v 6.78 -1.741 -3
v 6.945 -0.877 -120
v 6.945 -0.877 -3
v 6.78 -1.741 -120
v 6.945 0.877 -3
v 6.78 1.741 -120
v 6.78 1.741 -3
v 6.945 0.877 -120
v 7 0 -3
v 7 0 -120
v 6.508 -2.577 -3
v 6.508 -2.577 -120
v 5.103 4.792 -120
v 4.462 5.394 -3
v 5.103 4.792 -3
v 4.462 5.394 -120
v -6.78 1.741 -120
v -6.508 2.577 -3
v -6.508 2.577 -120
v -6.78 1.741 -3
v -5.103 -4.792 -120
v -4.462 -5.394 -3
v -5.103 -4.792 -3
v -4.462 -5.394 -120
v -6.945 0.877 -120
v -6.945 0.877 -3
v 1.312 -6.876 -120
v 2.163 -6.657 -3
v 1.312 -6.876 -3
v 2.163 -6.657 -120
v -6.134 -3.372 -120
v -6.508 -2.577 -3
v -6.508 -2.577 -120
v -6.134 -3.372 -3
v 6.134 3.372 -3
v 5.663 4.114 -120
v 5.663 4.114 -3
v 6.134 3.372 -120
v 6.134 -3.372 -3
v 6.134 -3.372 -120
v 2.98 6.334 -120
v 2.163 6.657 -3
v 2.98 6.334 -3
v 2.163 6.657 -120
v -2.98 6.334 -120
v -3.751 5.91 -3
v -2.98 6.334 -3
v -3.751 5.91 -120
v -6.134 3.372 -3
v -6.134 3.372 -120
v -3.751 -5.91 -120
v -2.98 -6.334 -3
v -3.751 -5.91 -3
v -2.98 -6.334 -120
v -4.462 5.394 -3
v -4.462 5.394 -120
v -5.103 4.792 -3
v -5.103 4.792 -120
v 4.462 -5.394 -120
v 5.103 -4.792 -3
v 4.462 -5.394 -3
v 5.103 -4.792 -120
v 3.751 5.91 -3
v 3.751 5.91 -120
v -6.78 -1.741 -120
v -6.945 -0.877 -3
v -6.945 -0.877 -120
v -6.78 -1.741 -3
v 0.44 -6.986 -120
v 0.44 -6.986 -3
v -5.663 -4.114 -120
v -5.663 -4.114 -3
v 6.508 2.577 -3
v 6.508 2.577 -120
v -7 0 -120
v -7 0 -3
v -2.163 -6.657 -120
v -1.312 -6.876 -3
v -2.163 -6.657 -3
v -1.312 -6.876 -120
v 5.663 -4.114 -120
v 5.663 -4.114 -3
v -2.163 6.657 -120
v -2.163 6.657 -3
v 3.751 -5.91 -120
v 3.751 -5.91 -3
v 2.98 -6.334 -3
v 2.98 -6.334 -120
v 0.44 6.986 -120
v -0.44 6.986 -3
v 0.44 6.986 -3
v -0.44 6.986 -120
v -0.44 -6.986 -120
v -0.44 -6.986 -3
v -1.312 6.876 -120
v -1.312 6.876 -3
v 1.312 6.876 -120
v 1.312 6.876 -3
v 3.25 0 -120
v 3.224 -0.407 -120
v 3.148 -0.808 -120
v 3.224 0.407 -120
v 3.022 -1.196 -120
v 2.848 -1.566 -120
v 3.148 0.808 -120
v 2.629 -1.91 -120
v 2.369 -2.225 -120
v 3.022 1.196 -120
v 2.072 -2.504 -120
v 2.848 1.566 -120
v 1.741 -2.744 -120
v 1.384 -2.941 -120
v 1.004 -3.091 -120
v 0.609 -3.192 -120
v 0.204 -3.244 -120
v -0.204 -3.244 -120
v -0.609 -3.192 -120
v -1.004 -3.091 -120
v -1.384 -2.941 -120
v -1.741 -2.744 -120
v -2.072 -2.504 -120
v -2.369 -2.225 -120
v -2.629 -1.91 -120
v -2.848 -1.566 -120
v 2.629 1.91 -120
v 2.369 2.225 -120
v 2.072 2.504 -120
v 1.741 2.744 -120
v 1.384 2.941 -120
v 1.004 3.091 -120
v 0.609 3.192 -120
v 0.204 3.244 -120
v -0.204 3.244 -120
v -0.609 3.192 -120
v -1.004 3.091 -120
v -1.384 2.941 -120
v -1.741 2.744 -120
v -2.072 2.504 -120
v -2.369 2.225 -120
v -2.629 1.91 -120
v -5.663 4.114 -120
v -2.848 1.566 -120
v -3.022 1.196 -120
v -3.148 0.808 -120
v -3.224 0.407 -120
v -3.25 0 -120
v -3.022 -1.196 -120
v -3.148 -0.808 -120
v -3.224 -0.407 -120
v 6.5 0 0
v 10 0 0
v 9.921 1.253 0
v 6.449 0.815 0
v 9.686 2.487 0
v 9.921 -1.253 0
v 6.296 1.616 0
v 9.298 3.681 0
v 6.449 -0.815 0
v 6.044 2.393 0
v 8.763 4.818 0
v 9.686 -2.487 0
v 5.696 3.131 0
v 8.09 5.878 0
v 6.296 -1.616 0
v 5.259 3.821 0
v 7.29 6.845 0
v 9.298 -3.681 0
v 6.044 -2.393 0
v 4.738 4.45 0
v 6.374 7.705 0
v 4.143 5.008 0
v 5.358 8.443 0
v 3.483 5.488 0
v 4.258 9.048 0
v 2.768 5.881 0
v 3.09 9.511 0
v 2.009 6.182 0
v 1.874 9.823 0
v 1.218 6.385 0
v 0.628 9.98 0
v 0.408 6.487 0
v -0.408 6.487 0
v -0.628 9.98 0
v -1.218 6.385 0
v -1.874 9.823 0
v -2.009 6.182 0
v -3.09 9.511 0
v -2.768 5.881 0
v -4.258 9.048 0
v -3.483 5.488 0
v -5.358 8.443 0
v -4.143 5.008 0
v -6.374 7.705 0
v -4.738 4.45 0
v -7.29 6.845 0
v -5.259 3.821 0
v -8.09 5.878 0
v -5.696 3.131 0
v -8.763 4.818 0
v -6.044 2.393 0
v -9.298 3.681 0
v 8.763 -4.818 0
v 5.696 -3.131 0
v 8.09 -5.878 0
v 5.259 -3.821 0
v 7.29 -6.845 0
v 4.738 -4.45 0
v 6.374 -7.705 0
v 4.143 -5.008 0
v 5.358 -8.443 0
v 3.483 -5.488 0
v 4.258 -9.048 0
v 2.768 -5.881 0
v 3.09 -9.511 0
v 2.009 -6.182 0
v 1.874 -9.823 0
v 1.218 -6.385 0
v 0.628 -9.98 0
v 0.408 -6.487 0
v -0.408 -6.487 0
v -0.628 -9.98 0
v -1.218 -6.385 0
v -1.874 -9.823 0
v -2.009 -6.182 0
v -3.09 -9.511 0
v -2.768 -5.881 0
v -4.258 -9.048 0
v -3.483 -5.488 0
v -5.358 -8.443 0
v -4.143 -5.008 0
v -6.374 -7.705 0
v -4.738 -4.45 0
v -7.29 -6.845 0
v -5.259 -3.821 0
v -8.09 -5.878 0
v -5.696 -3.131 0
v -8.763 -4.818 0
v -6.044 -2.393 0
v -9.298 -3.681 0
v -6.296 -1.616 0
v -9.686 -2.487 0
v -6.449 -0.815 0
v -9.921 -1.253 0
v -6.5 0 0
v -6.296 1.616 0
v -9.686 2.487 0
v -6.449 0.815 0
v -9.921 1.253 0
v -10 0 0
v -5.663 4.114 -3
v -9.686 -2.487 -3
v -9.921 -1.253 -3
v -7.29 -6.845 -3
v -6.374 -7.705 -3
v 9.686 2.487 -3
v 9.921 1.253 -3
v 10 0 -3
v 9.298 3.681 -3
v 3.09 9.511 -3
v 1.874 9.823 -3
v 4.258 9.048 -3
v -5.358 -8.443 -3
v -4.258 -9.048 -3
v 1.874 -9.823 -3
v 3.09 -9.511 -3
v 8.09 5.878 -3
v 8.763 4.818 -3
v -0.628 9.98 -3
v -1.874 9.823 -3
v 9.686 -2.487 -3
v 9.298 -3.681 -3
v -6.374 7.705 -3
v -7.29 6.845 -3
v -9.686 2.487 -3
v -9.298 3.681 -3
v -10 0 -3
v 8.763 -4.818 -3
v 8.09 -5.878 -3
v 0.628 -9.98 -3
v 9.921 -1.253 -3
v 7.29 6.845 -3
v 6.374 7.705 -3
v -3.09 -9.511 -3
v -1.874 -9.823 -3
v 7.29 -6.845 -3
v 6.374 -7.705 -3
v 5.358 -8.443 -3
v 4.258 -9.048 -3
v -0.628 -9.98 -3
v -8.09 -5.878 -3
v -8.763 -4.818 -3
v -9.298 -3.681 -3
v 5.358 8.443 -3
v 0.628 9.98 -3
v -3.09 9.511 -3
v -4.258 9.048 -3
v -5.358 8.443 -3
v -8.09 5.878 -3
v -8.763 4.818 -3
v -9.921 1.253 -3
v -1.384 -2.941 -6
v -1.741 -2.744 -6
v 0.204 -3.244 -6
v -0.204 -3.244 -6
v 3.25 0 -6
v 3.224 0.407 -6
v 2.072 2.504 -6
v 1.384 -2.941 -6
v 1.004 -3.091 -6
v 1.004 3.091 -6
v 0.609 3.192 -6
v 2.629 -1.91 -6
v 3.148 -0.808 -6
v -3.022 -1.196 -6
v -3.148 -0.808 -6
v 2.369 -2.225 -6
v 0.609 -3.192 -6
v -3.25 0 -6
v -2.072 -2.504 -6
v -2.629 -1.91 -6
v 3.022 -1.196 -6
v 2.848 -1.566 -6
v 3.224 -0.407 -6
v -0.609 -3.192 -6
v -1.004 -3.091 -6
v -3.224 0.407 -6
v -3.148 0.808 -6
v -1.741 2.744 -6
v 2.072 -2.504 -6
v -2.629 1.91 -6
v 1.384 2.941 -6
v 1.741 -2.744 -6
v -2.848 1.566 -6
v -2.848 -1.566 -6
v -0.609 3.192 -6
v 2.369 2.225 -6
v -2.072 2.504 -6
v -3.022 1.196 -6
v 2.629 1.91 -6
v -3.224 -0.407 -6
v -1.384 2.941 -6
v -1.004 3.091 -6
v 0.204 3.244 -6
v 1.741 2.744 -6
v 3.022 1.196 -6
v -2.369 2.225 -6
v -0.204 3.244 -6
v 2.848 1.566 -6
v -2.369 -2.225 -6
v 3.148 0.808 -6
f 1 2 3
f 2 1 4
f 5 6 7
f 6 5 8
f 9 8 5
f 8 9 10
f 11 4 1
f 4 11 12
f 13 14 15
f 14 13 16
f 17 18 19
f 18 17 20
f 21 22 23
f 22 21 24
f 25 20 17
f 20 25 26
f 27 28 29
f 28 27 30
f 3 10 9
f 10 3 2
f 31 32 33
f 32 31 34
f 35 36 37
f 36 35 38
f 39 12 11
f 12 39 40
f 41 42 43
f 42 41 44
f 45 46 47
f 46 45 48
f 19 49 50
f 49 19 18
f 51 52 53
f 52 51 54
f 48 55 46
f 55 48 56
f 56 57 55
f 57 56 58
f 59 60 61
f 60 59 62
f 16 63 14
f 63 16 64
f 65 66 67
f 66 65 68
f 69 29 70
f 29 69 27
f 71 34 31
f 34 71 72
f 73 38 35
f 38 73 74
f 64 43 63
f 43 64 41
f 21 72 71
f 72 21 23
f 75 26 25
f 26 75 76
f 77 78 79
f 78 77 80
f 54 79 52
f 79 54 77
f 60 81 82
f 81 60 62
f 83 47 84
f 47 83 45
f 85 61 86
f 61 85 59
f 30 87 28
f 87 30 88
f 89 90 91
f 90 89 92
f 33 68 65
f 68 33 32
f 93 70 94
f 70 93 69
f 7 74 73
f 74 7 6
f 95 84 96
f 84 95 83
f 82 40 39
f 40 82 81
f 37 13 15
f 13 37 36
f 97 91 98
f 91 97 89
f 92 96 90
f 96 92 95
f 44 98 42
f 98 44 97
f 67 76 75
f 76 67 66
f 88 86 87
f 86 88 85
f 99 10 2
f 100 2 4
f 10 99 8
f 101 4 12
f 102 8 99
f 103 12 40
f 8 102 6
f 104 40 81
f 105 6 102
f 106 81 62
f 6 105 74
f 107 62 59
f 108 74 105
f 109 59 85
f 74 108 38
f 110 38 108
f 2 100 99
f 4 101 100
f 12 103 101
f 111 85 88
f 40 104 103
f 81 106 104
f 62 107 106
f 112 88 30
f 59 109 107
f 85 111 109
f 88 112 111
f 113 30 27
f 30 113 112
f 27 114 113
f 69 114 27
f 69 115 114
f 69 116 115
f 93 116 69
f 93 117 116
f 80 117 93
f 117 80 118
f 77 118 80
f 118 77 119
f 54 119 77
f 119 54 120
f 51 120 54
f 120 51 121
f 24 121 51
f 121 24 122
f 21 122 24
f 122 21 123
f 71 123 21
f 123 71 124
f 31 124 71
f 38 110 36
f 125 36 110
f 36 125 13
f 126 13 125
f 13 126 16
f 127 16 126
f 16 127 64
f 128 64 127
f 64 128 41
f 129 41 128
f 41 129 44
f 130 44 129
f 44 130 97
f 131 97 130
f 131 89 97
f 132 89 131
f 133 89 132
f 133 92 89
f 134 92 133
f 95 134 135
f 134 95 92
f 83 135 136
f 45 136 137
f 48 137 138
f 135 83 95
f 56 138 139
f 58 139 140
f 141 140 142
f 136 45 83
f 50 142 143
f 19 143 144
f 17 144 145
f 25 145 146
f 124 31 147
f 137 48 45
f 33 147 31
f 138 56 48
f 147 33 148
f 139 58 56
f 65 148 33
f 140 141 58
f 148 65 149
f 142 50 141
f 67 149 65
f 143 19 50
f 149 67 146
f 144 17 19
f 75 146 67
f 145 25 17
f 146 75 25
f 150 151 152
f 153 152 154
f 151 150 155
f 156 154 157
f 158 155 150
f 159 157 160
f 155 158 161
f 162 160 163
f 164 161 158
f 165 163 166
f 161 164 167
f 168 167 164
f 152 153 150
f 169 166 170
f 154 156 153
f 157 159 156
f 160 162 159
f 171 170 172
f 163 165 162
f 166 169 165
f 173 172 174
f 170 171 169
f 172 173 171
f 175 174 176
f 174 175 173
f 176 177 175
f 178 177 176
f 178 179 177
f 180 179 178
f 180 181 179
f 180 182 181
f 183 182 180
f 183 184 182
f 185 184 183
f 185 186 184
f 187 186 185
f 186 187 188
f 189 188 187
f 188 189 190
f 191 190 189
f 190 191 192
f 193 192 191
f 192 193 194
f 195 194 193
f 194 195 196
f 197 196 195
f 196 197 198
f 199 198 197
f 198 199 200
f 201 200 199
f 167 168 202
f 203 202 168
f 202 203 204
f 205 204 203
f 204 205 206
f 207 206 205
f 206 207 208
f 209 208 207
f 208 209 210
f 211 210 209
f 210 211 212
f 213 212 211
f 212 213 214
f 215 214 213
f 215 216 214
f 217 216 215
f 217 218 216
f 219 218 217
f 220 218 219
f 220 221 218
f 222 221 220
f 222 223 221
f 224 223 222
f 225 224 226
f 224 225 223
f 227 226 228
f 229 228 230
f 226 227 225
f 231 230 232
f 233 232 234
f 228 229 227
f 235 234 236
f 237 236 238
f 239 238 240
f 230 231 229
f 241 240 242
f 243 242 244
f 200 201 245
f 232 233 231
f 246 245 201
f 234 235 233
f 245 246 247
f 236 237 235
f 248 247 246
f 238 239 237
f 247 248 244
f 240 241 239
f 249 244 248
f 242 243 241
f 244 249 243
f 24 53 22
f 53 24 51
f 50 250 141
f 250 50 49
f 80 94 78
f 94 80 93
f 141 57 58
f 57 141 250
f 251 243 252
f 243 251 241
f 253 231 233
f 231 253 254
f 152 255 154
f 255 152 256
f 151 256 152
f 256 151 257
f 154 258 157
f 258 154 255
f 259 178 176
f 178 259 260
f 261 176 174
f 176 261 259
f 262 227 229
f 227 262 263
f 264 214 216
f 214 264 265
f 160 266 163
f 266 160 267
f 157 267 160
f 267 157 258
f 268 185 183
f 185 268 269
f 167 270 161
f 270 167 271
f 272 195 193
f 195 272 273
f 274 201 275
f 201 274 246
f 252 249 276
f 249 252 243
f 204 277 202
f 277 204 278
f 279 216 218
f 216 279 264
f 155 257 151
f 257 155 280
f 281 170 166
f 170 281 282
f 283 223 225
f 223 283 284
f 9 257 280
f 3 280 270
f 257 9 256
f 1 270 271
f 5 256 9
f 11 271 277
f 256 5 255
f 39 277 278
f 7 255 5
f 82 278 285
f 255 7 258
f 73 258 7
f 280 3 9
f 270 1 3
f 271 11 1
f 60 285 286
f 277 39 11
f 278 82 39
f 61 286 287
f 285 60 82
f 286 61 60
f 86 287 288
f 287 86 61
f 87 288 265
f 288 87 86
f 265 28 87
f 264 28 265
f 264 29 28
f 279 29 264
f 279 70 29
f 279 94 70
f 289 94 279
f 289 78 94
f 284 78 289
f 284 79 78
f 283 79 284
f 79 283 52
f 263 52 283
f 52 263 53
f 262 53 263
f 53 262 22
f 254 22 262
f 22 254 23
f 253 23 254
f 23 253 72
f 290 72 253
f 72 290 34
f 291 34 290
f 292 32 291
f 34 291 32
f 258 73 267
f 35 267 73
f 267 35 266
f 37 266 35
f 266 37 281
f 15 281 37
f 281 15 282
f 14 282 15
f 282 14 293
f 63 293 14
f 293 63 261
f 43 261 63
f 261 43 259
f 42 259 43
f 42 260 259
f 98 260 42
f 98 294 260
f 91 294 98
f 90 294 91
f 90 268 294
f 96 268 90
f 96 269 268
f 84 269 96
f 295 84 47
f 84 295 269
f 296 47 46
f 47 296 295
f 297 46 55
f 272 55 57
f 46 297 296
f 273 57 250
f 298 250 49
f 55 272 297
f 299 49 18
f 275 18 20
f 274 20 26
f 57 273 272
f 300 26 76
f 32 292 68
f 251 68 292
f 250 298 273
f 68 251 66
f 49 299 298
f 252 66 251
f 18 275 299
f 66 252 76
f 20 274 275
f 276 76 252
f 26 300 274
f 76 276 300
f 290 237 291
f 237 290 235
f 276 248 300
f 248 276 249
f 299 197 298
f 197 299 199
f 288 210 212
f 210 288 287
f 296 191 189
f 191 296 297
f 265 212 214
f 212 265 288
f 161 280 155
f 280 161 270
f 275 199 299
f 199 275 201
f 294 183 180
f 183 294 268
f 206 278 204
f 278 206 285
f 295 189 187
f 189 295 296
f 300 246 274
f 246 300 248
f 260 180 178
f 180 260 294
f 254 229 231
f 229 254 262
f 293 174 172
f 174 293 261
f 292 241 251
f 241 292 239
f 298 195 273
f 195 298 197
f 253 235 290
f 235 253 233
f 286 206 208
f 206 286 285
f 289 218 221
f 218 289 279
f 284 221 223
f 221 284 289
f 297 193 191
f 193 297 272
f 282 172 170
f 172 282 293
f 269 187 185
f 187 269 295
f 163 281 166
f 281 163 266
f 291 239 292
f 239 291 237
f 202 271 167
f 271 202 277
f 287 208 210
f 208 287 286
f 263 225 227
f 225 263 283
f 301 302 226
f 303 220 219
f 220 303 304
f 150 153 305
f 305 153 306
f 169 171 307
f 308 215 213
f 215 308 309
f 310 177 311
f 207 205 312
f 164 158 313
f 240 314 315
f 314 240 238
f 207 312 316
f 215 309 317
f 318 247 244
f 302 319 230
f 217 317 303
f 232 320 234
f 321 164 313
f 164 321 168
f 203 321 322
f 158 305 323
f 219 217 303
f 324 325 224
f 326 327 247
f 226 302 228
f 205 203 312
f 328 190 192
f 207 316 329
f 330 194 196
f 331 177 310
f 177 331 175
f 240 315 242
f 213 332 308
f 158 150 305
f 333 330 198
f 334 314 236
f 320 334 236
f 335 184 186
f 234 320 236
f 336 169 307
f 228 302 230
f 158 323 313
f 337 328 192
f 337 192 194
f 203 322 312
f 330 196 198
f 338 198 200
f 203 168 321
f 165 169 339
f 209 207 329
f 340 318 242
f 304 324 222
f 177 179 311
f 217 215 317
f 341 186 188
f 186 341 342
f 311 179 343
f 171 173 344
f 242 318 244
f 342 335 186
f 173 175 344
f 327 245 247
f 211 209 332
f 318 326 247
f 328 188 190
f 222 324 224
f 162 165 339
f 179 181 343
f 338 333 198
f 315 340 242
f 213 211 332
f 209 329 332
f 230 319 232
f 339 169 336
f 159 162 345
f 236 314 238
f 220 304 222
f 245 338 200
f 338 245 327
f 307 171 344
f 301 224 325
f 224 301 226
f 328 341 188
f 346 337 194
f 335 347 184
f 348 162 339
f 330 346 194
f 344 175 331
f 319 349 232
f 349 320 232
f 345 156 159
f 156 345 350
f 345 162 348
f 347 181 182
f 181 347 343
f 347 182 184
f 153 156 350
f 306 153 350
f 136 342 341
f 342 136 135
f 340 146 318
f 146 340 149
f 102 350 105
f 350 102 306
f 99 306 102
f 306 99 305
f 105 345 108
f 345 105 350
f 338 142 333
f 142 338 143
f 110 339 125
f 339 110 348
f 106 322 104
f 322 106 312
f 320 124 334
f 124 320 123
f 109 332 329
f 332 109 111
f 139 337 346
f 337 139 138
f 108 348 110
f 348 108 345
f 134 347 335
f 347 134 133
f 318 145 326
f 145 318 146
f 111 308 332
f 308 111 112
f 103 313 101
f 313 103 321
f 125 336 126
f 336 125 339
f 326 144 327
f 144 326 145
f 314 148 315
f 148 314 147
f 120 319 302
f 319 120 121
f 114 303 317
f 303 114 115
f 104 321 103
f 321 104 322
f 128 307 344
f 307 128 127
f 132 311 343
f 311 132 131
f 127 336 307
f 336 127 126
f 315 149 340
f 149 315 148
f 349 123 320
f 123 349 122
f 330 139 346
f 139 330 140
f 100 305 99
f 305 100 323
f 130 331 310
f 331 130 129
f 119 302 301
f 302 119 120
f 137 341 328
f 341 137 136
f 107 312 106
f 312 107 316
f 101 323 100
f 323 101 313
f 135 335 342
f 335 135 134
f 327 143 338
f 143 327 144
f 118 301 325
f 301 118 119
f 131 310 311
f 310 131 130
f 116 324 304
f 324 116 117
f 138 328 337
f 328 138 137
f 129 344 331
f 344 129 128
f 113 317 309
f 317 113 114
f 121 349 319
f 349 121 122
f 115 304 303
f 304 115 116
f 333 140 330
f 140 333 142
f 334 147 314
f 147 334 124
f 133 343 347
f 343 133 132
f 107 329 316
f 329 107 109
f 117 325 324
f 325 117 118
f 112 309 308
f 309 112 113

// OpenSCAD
$fn = 50;


difference() {
	union() {
		translate(v = [0, 0, -120.0000000000]) {
			cylinder(h = 120, r = 7.0000000000);
		}
		translate(v = [0, 0, -3.0000000000]) {
			cylinder(h = 3, r = 10.0000000000);
		}
	}
	union() {
		translate(v = [0, 0, 0]) {
			rotate(a = [0, 0, 0]) {
				difference() {
					union() {
						#translate(v = [0, 0, -120.0000000000]) {
							cylinder(h = 120, r = 2.2500000000);
						}
						#translate(v = [0, 0, -6]) {
							cylinder(h = 6, r = 7.0000000000, r1 = 3.2500000000, r2 = 6.5000000000);
						}
						#translate(v = [0, 0, -120.0000000000]) {
							cylinder(h = 120, r = 3.2500000000);
						}
						#translate(v = [0, 0, -120.0000000000]) {
							cylinder(h = 120, r = 2.2500000000);
						}
					}
					union();
				}
			}
		}
	}
}
